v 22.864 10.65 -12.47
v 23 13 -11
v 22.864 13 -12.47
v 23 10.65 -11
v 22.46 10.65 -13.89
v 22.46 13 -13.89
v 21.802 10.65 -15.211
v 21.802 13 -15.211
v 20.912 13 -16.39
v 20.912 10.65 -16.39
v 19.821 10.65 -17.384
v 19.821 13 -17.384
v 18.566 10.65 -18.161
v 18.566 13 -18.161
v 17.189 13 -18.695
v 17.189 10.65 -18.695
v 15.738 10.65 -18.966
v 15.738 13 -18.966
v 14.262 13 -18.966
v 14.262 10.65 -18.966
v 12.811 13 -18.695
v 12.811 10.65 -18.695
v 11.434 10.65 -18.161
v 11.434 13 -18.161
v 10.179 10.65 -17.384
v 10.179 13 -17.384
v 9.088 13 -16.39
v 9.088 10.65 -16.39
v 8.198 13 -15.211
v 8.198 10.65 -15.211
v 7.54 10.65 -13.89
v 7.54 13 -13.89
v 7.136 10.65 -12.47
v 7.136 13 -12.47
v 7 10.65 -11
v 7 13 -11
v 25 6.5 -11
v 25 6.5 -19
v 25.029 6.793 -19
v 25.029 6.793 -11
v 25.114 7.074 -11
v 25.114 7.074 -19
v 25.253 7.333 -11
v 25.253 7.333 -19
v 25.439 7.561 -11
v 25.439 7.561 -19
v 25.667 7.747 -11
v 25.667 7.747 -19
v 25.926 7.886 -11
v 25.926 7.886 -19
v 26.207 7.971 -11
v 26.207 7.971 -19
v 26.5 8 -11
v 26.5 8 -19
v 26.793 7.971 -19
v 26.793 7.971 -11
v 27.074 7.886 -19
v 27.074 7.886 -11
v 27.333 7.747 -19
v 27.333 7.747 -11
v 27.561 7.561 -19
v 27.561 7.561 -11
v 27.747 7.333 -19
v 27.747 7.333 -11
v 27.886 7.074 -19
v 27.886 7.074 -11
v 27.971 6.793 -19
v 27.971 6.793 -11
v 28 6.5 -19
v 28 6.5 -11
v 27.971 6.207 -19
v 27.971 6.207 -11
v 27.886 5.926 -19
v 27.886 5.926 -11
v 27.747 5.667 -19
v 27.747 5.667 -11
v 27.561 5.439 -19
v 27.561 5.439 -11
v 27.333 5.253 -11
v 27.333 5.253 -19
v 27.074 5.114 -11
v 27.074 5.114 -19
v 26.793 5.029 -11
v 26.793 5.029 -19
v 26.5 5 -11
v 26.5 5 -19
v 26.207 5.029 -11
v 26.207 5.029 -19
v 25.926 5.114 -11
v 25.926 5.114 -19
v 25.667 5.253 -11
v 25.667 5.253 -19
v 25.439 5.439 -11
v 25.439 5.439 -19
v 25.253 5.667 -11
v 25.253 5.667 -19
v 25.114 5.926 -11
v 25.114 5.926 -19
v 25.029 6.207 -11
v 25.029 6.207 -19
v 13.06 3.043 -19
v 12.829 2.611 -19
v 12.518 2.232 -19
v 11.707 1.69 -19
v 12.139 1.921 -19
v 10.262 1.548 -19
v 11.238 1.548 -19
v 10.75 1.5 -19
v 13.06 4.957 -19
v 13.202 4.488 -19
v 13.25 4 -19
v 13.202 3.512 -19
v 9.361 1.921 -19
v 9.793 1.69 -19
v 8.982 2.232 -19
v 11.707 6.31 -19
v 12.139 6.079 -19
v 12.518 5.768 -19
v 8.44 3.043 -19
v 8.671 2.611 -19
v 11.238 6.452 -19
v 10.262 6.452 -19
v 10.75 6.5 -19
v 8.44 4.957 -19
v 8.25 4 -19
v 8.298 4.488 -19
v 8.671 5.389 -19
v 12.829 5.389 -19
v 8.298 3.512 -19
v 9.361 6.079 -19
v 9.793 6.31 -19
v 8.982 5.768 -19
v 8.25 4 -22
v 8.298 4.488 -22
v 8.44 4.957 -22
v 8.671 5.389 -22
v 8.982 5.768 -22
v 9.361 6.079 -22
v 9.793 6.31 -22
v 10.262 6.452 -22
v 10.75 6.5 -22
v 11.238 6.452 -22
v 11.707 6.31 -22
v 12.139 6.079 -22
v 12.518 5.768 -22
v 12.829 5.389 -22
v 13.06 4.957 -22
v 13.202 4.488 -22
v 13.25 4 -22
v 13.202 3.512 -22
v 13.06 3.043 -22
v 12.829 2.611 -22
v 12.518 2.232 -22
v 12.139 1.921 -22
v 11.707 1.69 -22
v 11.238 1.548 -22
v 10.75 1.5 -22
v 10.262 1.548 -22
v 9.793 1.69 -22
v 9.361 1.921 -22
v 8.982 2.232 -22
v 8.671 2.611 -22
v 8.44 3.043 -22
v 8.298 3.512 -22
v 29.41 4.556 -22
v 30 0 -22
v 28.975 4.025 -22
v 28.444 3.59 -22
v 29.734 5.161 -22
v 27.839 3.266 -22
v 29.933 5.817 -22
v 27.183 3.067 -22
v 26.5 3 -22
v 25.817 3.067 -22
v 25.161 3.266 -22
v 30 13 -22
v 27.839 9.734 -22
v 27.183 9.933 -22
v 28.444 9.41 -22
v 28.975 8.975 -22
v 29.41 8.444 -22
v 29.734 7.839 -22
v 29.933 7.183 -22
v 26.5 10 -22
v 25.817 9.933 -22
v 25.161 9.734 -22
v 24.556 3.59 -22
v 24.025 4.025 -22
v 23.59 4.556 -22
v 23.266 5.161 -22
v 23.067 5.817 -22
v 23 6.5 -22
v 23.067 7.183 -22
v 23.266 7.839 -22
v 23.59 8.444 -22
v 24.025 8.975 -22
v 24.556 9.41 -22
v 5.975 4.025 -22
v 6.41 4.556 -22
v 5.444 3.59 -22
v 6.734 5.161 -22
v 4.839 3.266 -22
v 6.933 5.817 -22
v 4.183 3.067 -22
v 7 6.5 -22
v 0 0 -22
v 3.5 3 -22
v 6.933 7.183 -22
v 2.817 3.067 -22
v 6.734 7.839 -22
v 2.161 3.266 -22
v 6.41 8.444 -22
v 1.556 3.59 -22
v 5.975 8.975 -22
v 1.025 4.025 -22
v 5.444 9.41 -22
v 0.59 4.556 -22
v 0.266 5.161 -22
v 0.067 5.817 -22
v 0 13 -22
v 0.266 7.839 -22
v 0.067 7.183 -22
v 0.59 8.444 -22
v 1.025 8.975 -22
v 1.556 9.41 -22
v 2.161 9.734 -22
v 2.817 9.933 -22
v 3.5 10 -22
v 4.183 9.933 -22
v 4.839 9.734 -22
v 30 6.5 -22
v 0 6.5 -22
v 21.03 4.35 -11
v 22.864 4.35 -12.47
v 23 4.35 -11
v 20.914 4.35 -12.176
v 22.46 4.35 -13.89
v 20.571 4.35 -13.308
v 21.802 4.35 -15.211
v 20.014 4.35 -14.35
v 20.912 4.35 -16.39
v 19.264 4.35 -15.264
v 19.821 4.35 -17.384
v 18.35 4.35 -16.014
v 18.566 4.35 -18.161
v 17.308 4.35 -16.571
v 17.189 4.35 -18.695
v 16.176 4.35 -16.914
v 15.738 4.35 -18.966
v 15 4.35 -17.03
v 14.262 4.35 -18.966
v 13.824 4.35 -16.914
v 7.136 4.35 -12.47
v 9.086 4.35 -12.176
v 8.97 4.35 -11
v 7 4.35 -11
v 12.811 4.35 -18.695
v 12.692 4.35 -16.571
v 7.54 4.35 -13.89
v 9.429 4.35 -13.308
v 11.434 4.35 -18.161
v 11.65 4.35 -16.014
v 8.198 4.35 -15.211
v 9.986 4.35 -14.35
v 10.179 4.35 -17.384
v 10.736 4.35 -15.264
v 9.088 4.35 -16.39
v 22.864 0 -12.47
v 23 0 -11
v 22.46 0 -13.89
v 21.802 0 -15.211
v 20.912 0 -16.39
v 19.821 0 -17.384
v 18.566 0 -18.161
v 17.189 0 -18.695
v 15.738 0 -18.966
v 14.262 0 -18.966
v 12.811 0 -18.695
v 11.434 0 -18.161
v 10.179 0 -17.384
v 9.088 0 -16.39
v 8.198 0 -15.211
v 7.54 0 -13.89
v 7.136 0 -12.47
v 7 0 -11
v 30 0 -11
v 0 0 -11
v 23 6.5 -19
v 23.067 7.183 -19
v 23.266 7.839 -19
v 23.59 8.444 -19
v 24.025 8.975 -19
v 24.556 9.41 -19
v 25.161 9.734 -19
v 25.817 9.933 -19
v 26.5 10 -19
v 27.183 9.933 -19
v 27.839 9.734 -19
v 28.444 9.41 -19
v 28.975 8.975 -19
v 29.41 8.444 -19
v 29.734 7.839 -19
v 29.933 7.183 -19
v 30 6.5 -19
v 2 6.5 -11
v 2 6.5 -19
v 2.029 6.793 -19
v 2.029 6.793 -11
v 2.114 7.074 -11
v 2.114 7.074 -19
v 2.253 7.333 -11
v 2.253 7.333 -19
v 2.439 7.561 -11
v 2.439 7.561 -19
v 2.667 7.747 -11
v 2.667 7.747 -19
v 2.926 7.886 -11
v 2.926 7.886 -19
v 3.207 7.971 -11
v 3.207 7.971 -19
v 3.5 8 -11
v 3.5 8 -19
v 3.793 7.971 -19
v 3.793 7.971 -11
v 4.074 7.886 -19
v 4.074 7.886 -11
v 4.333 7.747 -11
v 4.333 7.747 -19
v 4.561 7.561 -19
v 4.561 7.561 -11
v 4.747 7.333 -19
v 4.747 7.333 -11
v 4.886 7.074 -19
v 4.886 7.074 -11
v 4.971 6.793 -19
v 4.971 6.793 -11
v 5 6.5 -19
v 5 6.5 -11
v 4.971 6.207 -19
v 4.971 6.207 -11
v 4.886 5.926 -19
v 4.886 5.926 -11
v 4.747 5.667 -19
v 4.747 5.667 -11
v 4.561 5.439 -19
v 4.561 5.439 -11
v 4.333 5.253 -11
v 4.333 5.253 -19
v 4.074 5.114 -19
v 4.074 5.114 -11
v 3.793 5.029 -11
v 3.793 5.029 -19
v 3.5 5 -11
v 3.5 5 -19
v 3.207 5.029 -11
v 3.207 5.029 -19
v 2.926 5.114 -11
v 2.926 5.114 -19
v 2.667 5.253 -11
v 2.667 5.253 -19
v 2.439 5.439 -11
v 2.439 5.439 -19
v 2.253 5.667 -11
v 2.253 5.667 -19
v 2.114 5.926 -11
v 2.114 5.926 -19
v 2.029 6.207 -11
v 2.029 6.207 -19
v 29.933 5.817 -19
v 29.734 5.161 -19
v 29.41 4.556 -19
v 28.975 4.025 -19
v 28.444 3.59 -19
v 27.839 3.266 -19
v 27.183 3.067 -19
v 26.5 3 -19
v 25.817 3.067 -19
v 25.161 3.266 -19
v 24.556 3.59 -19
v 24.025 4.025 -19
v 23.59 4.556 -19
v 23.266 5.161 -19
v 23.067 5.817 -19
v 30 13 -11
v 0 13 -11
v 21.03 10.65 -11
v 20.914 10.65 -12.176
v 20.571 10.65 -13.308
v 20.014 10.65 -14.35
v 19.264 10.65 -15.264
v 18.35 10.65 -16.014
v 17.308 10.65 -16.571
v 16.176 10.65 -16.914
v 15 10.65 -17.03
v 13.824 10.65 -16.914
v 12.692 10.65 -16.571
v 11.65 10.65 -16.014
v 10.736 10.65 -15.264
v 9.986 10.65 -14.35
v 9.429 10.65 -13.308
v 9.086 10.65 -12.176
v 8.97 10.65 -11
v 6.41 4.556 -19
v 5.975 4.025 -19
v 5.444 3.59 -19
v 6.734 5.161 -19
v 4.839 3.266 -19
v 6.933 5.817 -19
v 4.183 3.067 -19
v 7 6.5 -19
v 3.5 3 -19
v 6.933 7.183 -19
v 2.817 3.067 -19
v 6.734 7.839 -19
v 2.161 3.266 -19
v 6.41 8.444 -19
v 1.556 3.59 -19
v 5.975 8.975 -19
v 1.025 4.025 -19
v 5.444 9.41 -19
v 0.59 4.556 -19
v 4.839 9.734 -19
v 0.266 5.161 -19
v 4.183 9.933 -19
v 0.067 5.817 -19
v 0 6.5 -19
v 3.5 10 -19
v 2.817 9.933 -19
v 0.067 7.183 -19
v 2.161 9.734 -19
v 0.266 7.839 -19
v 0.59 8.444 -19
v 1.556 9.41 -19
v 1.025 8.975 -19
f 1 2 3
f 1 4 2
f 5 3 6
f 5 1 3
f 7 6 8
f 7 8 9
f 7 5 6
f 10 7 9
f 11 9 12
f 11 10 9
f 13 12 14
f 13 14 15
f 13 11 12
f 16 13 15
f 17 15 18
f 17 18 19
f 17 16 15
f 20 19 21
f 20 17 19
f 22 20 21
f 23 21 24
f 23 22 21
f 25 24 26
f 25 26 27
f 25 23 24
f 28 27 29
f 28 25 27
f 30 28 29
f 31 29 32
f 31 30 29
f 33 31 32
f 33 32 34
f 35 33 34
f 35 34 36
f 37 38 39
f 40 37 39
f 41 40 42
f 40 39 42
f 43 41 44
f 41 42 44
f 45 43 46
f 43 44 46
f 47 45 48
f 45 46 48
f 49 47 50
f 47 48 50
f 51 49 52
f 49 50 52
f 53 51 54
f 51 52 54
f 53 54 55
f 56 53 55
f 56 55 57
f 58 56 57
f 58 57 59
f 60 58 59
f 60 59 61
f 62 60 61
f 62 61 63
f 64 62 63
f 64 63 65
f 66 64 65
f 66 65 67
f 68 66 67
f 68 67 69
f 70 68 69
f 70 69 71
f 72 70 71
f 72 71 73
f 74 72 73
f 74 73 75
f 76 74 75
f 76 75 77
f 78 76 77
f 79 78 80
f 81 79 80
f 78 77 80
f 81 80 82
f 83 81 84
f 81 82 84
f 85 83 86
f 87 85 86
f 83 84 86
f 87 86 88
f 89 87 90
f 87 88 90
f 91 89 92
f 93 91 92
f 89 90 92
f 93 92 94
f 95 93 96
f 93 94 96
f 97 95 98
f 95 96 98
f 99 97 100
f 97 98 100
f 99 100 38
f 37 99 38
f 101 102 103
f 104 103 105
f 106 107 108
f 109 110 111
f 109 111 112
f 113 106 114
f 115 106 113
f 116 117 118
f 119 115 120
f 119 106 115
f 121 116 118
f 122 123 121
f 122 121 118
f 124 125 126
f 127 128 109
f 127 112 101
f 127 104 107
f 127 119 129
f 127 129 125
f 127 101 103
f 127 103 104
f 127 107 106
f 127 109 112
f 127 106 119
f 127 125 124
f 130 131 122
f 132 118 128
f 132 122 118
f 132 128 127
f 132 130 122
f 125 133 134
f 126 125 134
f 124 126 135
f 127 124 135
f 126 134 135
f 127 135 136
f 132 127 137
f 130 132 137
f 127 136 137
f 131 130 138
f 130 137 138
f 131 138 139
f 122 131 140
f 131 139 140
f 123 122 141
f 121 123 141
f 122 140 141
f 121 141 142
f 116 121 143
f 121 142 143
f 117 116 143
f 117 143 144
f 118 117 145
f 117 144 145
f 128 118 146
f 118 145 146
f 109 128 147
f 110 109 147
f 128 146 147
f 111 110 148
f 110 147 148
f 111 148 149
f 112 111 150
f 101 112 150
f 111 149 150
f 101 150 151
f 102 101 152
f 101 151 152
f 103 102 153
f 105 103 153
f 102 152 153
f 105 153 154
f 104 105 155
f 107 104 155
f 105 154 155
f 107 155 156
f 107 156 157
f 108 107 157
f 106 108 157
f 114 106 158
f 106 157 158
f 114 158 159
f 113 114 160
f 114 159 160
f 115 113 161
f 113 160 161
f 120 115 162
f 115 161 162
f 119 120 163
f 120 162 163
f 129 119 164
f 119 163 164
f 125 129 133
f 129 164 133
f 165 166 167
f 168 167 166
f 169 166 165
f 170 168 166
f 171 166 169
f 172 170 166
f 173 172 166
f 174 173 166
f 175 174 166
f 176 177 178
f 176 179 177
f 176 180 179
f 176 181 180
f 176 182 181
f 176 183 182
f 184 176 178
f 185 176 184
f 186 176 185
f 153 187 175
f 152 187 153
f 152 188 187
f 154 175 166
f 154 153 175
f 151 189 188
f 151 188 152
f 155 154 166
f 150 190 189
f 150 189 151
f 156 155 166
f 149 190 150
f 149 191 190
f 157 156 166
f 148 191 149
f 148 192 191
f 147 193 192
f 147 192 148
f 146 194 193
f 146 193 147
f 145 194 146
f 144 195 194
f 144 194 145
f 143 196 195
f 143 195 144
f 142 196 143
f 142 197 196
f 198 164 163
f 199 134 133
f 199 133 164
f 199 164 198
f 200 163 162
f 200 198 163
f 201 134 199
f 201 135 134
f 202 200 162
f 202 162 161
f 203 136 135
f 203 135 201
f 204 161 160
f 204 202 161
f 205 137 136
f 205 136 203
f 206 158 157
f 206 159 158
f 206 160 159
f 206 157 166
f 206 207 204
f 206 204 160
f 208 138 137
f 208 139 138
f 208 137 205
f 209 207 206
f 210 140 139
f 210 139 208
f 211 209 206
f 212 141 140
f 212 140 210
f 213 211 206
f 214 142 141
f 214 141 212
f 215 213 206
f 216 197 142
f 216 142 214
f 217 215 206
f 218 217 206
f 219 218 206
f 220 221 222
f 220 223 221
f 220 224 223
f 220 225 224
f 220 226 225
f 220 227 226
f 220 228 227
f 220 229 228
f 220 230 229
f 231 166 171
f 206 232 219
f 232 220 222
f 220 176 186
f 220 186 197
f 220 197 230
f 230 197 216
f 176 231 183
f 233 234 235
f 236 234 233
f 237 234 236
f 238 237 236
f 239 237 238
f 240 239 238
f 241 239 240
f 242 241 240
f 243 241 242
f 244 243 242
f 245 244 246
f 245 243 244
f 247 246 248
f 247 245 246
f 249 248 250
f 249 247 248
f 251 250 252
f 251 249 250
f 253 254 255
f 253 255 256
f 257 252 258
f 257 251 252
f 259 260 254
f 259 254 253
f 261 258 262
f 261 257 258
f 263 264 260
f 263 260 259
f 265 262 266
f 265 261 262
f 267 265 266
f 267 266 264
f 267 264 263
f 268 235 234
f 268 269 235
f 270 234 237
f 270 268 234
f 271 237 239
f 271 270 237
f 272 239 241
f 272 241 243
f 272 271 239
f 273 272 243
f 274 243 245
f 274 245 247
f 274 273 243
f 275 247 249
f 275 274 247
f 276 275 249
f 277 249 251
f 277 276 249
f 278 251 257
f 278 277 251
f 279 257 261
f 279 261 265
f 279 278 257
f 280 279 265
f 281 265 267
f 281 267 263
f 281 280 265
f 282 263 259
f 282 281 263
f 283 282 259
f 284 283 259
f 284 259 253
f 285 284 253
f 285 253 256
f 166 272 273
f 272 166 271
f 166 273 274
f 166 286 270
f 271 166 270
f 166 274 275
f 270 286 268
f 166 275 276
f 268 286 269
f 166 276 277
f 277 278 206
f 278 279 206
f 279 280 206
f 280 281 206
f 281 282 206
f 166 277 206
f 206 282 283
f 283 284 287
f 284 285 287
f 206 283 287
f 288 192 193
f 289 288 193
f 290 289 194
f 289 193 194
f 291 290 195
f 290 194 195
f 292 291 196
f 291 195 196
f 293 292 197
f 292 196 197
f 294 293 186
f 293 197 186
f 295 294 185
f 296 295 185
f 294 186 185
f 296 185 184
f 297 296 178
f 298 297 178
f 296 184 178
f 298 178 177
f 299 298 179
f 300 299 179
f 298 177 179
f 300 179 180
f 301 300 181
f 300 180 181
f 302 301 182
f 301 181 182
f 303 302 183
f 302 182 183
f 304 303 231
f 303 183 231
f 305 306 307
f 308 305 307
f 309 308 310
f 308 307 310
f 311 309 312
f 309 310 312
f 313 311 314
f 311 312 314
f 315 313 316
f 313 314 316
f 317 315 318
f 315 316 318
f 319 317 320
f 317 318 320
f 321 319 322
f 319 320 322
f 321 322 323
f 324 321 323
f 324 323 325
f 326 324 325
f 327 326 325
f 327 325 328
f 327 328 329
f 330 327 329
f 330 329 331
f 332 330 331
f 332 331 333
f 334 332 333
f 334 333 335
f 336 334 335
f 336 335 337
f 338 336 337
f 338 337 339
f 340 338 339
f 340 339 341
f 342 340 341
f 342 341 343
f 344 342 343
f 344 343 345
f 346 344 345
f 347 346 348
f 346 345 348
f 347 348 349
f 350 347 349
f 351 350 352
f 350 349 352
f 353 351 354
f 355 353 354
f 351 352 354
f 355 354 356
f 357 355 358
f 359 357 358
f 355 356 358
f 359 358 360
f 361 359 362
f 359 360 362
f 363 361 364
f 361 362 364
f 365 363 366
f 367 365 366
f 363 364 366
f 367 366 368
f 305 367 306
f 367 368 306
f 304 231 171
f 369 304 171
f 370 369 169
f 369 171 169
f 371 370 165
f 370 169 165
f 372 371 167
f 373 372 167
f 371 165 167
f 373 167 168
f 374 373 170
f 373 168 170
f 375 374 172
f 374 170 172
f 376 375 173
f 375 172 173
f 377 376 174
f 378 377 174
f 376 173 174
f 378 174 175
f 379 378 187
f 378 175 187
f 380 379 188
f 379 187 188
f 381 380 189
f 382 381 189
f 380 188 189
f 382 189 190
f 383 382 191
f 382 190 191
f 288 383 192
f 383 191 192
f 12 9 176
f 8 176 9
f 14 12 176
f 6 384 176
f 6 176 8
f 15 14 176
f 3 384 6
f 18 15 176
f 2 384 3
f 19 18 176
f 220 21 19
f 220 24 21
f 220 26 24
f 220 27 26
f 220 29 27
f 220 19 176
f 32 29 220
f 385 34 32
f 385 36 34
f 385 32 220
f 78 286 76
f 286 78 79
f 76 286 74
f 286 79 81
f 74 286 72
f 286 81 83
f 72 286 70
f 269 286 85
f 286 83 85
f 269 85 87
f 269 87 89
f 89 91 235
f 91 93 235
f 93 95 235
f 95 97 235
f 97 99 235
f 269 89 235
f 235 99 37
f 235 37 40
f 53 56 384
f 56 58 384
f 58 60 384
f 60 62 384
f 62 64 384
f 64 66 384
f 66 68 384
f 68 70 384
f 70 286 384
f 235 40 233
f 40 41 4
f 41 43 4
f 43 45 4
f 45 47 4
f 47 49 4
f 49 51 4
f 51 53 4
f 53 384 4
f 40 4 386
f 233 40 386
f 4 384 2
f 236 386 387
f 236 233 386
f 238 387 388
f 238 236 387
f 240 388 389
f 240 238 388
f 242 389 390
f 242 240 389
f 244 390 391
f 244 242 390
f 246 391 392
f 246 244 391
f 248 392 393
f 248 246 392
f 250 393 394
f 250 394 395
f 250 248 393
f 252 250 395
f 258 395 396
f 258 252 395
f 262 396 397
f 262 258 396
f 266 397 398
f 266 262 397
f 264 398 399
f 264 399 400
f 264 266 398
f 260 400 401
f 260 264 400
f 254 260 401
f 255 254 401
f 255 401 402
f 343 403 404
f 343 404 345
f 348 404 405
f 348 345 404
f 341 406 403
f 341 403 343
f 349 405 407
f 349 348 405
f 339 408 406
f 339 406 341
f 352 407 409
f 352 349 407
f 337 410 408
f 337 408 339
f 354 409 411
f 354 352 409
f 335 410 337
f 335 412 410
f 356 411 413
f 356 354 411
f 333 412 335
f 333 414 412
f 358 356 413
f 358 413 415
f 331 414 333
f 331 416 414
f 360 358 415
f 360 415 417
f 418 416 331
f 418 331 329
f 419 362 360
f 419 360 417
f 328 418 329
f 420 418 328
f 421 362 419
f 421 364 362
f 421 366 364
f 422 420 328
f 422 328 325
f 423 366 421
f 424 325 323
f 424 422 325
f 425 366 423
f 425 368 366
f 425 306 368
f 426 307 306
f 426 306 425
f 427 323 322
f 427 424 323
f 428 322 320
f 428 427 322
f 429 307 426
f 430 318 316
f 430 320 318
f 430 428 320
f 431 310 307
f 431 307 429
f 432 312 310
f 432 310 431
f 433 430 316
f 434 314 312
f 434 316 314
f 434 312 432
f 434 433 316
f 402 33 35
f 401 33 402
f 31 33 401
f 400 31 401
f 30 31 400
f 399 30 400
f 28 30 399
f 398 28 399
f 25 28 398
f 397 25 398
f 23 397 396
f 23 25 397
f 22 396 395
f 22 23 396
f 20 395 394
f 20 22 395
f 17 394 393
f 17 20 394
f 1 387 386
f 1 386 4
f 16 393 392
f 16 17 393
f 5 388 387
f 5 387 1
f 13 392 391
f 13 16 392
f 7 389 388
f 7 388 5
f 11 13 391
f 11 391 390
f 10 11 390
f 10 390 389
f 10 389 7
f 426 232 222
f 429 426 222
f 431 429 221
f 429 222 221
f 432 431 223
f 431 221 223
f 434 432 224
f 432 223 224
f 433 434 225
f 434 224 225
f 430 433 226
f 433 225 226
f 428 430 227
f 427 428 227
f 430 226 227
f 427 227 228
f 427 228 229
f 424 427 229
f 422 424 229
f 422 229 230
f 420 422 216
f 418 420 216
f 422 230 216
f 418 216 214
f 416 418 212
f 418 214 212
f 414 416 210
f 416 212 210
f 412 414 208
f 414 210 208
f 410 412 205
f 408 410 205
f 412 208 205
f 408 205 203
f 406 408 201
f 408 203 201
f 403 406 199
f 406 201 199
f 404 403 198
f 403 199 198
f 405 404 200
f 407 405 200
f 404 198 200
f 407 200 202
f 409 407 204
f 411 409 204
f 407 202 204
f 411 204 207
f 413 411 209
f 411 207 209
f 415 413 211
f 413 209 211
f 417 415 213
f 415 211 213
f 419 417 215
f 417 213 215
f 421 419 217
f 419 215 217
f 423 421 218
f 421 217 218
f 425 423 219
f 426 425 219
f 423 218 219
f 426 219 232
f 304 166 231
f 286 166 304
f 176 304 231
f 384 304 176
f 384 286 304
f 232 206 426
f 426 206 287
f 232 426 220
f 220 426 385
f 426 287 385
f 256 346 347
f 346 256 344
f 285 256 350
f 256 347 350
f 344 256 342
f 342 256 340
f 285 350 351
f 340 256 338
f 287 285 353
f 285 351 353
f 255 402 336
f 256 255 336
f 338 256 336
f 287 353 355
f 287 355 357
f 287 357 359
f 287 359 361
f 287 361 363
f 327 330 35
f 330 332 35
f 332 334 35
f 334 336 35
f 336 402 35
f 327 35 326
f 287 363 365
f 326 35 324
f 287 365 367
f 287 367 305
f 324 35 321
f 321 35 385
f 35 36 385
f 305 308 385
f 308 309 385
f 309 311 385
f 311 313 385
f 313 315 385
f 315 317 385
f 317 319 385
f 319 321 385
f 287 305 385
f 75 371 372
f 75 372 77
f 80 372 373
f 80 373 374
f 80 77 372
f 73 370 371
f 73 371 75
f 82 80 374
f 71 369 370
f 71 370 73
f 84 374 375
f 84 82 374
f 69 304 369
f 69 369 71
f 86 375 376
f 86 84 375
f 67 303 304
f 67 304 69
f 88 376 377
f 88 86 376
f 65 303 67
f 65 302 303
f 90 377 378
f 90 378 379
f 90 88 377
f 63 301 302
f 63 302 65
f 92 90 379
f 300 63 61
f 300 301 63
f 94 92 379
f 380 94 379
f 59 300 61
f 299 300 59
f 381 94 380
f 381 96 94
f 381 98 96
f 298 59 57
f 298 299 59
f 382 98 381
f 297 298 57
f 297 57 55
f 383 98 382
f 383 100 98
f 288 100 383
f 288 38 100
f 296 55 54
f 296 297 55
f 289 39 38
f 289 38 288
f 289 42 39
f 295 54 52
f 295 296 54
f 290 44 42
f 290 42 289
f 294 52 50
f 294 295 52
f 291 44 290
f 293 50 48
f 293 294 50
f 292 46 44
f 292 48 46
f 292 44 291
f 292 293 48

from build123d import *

# Parameters (mm, degrees)
SKETCH016_W             = 30
SKETCH016_H             = 13
PAD006_DEPTH            = 11
GROOVE001_ANGLE         = 180
SKETCH018_R             = 1.5
POCKET007_DEPTH         = 20
SKETCH019_R             = 3.5
POCKET008_DEPTH         = 3
SKETCH041_R             = 2.5
POCKET017_DEPTH         = 3
BODY001_PLACEMENT_ANGLE = 180


with BuildPart() as part:
    # Sketch016 → Pad006 (new body)
    with BuildSketch(Plane.XY):
        with Locations((-25, 6.5)):
            Rectangle(SKETCH016_W, SKETCH016_H)
    extrude(amount=PAD006_DEPTH)

    # Sketch017 (on Face5 of Pad006) → Groove001 (revolve, cut)
    with BuildSketch(Plane(origin=(0, 0, 0), x_dir=(1, 0, 0), z_dir=(0, 0, -1))):
        Polygon((-33, -13), (-33, -10.65), (-31.03, -10.65), (-31.03, -4.35), (-33, -4.35), (-33, 0), (-25, 0), (-25, -13), align=None)
    revolve(axis=Axis((-25, 0, 0), (0, 1, 0)), revolution_arc=GROOVE001_ANGLE, mode=Mode.SUBTRACT)

    # Sketch018 (on Face6 of Groove001) → Pocket007 (cut)
    with BuildSketch(Plane.XY.offset(11)):
        with Locations((-36.5, 6.5)):
            Circle(SKETCH018_R)
        with Locations((-13.5, 6.5)):
            Circle(SKETCH018_R)
    extrude(amount=-POCKET007_DEPTH, mode=Mode.SUBTRACT)

    # Sketch019 (on Face6 of Pocket007) → Pocket008 (cut)
    with BuildSketch(Plane.XY.offset(11)):
        with Locations((-36.5, 6.5)):
            Circle(SKETCH019_R)
        with Locations((-13.5, 6.5)):
            Circle(SKETCH019_R)
    extrude(amount=-POCKET008_DEPTH, mode=Mode.SUBTRACT)

    # Sketch041 (on Face6 of Pocket008) → Pocket017 (cut)
    with BuildSketch(Plane.XY.offset(11)):
        with Locations((-20.75, 4)):
            Circle(SKETCH041_R)
    extrude(amount=-POCKET017_DEPTH, mode=Mode.SUBTRACT)


with BuildPart() as part_1:
    # Body001 placement: moved
    add(part.part.moved(Location((-10, 0, -11))).rotate(Axis((-10, 0, -11), (0, 1, 0)), BODY001_PLACEMENT_ANGLE))


solid = part_1.part
